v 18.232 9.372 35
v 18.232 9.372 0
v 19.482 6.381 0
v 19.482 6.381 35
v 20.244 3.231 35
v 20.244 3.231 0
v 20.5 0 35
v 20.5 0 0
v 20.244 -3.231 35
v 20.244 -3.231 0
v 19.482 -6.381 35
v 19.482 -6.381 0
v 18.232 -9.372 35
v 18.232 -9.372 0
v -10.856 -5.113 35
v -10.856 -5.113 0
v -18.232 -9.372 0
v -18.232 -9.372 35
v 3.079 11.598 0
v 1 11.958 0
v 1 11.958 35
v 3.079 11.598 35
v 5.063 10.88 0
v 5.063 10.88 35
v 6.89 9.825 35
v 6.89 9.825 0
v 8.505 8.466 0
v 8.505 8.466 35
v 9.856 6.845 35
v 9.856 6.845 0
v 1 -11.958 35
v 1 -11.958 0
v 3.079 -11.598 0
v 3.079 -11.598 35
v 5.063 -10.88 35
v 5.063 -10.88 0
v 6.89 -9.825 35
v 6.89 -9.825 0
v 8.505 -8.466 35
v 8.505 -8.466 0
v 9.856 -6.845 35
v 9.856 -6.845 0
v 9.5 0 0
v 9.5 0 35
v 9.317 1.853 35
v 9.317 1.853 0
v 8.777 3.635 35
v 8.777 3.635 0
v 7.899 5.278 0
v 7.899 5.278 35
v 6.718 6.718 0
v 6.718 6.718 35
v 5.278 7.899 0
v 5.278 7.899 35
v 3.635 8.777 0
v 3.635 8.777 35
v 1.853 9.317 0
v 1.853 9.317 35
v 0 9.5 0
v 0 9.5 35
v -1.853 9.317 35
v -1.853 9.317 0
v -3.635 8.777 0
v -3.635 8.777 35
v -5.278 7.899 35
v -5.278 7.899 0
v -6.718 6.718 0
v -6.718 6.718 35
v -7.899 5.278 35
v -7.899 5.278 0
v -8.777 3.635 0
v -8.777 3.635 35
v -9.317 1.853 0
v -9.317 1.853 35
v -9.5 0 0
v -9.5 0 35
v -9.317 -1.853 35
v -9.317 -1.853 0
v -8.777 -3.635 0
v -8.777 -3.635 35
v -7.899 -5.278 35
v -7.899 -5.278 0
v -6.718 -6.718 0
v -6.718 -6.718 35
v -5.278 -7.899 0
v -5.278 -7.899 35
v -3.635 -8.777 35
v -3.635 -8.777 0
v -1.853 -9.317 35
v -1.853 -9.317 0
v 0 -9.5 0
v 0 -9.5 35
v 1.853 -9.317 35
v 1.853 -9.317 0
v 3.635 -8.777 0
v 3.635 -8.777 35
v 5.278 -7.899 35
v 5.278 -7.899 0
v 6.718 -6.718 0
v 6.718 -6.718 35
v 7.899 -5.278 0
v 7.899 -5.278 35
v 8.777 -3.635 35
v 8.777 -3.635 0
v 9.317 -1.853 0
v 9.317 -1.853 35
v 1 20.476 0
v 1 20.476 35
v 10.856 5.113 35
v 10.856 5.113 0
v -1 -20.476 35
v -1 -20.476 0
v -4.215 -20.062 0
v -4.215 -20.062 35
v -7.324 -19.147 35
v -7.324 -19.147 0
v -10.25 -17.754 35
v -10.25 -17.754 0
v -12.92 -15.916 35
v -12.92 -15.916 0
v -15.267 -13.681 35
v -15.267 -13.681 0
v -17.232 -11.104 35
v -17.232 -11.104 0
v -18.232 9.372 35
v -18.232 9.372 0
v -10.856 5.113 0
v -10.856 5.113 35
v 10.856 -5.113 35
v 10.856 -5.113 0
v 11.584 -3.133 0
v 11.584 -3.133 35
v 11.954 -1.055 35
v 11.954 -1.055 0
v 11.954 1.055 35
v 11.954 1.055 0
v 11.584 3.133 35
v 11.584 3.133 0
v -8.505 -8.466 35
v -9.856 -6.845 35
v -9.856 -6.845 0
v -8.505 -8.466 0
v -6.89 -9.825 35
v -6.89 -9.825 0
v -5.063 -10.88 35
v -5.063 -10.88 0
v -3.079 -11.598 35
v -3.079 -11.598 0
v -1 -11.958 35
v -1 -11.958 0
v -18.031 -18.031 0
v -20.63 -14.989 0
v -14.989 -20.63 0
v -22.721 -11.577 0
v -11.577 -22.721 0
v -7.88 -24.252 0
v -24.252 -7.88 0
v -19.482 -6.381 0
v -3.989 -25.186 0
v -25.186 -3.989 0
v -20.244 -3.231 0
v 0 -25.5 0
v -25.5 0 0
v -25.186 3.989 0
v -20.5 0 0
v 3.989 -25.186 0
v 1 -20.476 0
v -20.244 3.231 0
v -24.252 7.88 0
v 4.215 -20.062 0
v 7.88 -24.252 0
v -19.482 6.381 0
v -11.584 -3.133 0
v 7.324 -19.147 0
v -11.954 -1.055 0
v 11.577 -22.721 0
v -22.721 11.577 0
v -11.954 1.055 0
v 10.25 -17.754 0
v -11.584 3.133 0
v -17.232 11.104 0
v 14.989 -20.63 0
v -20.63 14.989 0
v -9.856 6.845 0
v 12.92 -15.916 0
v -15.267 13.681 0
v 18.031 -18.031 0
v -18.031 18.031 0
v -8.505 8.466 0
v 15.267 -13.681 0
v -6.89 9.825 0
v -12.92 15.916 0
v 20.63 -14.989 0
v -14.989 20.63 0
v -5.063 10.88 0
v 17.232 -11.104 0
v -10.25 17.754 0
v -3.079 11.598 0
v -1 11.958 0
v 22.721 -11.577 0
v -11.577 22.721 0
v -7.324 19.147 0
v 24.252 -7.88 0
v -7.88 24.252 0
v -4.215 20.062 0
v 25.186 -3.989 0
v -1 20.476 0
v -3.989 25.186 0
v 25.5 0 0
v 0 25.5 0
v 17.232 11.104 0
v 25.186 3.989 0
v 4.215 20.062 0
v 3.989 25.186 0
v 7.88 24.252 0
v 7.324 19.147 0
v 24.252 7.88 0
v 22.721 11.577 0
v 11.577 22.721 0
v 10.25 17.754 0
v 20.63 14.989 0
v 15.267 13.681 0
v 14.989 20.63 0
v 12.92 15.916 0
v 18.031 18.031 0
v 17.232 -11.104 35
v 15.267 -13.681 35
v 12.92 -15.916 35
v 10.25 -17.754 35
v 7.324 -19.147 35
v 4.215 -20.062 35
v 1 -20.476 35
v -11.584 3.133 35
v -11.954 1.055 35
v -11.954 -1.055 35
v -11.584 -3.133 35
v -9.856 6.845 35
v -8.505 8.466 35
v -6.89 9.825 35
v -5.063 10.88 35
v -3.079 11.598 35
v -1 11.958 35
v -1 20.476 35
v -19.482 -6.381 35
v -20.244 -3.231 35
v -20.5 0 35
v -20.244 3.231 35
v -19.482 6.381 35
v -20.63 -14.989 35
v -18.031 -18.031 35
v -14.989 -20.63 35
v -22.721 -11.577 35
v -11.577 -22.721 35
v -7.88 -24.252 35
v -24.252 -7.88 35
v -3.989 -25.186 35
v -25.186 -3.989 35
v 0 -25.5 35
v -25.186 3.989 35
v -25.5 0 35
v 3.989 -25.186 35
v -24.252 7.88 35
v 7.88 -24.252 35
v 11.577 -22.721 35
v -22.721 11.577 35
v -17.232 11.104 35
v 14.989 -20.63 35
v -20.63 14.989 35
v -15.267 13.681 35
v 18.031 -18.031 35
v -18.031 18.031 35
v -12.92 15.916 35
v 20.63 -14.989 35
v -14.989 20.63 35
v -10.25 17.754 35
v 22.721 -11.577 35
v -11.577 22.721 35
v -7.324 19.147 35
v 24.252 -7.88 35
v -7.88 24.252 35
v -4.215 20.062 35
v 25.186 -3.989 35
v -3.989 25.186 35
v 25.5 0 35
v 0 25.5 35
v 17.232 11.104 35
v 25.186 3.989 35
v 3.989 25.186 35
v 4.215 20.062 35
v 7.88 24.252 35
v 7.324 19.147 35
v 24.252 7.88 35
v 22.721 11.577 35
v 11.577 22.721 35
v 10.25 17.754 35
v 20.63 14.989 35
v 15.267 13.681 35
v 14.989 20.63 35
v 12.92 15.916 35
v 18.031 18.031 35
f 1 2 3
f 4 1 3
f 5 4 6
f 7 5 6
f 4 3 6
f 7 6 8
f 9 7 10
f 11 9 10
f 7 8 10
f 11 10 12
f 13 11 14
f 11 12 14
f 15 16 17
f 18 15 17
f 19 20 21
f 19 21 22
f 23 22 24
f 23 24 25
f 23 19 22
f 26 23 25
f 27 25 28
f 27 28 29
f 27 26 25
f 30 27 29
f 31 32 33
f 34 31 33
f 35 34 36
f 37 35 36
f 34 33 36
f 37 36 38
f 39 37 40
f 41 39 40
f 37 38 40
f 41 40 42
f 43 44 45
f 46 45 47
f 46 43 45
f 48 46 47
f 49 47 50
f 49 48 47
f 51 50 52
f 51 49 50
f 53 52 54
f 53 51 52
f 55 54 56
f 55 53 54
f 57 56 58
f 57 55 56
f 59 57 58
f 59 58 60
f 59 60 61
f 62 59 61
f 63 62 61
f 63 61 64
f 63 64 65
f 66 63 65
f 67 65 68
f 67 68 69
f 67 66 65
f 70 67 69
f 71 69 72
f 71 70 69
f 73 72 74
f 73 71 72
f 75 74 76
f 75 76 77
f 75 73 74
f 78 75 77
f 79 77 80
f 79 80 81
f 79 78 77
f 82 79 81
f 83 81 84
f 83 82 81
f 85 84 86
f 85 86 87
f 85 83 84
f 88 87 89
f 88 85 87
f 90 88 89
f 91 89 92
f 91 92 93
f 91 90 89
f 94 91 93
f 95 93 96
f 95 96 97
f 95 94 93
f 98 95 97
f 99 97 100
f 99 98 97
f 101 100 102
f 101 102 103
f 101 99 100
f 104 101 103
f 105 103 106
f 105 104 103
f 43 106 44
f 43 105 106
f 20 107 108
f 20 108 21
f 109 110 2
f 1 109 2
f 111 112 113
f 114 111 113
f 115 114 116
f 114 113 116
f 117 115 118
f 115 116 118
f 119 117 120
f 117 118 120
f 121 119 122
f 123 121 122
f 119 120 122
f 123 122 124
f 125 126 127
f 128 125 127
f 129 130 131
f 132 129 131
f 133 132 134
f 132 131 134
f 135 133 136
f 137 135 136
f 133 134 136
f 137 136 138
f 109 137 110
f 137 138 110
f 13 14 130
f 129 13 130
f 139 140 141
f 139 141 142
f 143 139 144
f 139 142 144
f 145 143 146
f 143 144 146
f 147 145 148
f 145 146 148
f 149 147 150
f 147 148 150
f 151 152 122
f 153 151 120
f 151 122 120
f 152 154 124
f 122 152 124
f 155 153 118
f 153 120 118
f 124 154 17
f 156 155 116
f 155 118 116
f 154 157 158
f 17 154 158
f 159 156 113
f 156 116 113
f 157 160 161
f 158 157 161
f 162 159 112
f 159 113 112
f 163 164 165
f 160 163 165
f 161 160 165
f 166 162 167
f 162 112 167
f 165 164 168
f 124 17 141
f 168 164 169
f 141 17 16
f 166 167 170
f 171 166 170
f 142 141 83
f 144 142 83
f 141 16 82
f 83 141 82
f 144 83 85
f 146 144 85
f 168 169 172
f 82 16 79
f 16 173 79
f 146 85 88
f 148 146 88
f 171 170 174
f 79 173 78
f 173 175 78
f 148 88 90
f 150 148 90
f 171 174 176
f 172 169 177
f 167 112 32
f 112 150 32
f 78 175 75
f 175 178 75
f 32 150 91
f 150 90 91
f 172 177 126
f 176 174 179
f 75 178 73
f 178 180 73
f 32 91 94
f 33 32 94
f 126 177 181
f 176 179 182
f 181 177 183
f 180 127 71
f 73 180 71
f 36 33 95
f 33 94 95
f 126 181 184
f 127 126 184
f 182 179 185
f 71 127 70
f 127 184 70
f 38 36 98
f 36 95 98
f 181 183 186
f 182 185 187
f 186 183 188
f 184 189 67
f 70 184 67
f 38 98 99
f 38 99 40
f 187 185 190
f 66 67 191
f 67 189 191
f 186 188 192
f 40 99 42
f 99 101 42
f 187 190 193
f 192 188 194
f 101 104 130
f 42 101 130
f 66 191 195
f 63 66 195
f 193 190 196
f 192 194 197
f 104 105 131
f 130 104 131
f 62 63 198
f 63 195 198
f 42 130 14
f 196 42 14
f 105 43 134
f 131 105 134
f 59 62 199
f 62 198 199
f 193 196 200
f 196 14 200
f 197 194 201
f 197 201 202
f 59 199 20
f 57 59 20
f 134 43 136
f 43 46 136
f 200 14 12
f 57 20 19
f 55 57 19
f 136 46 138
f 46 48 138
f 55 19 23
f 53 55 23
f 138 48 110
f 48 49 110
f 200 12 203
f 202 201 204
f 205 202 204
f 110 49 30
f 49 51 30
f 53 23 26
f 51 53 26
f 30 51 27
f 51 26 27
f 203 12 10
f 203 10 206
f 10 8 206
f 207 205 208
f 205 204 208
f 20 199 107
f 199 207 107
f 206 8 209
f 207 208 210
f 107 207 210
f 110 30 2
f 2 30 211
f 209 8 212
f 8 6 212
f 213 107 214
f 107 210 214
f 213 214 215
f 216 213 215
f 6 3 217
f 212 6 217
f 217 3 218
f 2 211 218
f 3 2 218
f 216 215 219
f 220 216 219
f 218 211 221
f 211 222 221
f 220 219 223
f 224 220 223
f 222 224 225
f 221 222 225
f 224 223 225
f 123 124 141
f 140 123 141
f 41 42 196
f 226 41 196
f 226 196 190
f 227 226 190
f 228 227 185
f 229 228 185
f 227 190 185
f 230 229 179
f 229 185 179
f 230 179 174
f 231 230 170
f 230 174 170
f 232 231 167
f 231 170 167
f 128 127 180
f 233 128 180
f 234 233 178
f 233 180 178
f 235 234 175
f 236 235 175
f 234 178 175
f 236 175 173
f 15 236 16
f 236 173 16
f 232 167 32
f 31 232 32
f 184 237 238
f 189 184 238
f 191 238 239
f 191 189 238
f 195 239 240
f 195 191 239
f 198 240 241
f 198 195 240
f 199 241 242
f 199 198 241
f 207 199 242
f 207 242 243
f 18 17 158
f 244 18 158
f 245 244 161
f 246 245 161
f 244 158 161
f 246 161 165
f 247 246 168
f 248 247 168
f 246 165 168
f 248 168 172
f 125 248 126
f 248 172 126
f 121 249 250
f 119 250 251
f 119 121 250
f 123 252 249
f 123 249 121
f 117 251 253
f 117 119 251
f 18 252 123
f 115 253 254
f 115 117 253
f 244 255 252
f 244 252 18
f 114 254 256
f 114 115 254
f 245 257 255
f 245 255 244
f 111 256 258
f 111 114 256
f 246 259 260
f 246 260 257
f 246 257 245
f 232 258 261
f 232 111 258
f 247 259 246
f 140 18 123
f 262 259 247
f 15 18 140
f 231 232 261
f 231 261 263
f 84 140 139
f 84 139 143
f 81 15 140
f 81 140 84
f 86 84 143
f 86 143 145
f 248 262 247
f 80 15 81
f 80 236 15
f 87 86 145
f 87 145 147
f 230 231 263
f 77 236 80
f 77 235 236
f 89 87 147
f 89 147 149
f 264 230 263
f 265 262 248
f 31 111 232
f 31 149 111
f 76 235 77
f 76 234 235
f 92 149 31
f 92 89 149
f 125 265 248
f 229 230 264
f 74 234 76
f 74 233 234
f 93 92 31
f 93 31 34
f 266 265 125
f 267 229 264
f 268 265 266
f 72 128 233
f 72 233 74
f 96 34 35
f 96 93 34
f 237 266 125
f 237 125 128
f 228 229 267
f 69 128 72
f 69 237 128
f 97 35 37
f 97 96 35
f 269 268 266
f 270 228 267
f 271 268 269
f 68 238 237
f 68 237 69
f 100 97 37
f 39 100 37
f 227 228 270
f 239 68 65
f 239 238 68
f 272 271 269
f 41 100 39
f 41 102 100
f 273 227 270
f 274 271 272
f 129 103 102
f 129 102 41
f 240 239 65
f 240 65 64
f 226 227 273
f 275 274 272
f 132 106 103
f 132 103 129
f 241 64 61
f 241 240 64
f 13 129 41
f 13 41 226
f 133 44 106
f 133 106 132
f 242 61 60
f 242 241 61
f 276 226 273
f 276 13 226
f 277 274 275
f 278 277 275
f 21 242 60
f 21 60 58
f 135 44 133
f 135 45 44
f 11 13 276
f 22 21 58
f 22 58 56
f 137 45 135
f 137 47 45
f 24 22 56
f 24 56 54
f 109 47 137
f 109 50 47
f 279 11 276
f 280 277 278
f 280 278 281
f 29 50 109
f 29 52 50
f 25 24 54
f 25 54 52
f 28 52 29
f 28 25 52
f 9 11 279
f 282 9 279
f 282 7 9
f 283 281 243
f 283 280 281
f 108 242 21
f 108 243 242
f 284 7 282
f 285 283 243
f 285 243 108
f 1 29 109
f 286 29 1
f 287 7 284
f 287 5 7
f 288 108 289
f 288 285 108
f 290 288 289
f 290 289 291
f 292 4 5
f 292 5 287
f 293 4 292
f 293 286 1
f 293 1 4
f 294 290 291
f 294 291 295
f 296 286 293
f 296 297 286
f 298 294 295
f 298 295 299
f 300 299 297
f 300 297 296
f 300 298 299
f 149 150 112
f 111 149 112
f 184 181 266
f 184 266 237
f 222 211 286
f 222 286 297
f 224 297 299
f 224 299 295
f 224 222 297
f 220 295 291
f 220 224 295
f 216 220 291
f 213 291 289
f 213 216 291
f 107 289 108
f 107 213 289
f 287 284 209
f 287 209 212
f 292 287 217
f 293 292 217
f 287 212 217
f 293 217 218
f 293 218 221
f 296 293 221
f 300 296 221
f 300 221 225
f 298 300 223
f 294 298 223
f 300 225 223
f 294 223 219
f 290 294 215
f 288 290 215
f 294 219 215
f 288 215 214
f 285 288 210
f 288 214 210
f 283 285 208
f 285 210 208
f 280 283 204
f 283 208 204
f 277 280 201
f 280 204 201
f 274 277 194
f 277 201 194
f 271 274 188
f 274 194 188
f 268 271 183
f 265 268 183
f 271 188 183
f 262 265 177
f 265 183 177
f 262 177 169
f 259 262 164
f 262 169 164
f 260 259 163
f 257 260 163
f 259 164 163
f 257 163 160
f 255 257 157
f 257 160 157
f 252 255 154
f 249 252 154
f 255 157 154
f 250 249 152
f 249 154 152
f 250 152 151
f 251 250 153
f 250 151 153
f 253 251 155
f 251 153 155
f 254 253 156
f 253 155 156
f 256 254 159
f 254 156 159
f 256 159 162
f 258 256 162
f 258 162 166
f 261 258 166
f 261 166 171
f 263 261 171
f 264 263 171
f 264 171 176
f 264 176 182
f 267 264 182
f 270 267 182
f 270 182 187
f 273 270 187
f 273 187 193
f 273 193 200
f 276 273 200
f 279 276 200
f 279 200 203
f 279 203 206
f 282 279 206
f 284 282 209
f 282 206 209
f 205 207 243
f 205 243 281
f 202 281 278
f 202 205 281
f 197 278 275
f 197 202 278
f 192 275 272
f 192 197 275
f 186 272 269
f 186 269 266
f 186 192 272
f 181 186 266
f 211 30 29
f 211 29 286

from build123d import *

# Parameters (mm, degrees)
ESQUISSE1_R      = 25.5
ESQUISSE1_R_2    = 9.5
EXTRUSION1_DEPTH = 35


with BuildPart() as part:
    # Esquisse1 → Extrusion1 (new body)
    with BuildSketch(Plane.XY):
        Circle(ESQUISSE1_R)
        Circle(ESQUISSE1_R_2, mode=Mode.SUBTRACT)
        with BuildLine():
            Line((10.856157589, 5.113104968), (18.232385626, 9.371772211))
            ThreePointArc((18.232385626, 9.371772211), (20.5, 0), (18.232385626, -9.371772211))
            Line((18.232385626, -9.371772211), (10.856157589, -5.113104968))
            ThreePointArc((10.856157589, -5.113104968), (12, 0), (10.856157589, 5.113104968))
        make_face(mode=Mode.SUBTRACT)
        with BuildLine():
            Line((9.856157589, 6.845155775), (17.232385626, 11.103823019))
            ThreePointArc((17.232385626, 11.103823019), (10.25, 17.753520778), (1, 20.475595229))
            Line((1, 20.475595229), (1, 11.958260743))
            ThreePointArc((1, 11.958260743), (6, 10.392304845), (9.856157589, 6.845155775))
        make_face(mode=Mode.SUBTRACT)
        with BuildLine():
            Line((9.856157589, -6.845155775), (17.232385626, -11.103823019))
            ThreePointArc((17.232385626, -11.103823019), (10.25, -17.753520778), (1, -20.475595229))
            Line((1, -20.475595229), (1, -11.958260743))
            ThreePointArc((1, -11.958260743), (6, -10.392304845), (9.856157589, -6.845155775))
        make_face(mode=Mode.SUBTRACT)
        with BuildLine():
            Line((-1, 11.958260743), (-1, 20.475595229))
            ThreePointArc((-1, 20.475595229), (-10.25, 17.753520778), (-17.232385626, 11.103823019))
            Line((-17.232385626, 11.103823019), (-9.856157589, 6.845155775))
            ThreePointArc((-9.856157589, 6.845155775), (-6, 10.392304845), (-1, 11.958260743))
        make_face(mode=Mode.SUBTRACT)
        with BuildLine():
            Line((-1, -11.958260743), (-1, -20.475595229))
            ThreePointArc((-1, -20.475595229), (-10.25, -17.753520778), (-17.232385626, -11.103823019))
            Line((-17.232385626, -11.103823019), (-9.856157589, -6.845155775))
            ThreePointArc((-9.856157589, -6.845155775), (-6, -10.392304845), (-1, -11.958260743))
        make_face(mode=Mode.SUBTRACT)
        with BuildLine():
            Line((-10.856157589, -5.113104968), (-18.232385626, -9.371772211))
            ThreePointArc((-18.232385626, -9.371772211), (-20.5, 0), (-18.232385626, 9.371772211))
            Line((-18.232385626, 9.371772211), (-10.856157589, 5.113104968))
            ThreePointArc((-10.856157589, 5.113104968), (-12, 0), (-10.856157589, -5.113104968))
        make_face(mode=Mode.SUBTRACT)
    extrude(amount=EXTRUSION1_DEPTH)


solid = part.part
